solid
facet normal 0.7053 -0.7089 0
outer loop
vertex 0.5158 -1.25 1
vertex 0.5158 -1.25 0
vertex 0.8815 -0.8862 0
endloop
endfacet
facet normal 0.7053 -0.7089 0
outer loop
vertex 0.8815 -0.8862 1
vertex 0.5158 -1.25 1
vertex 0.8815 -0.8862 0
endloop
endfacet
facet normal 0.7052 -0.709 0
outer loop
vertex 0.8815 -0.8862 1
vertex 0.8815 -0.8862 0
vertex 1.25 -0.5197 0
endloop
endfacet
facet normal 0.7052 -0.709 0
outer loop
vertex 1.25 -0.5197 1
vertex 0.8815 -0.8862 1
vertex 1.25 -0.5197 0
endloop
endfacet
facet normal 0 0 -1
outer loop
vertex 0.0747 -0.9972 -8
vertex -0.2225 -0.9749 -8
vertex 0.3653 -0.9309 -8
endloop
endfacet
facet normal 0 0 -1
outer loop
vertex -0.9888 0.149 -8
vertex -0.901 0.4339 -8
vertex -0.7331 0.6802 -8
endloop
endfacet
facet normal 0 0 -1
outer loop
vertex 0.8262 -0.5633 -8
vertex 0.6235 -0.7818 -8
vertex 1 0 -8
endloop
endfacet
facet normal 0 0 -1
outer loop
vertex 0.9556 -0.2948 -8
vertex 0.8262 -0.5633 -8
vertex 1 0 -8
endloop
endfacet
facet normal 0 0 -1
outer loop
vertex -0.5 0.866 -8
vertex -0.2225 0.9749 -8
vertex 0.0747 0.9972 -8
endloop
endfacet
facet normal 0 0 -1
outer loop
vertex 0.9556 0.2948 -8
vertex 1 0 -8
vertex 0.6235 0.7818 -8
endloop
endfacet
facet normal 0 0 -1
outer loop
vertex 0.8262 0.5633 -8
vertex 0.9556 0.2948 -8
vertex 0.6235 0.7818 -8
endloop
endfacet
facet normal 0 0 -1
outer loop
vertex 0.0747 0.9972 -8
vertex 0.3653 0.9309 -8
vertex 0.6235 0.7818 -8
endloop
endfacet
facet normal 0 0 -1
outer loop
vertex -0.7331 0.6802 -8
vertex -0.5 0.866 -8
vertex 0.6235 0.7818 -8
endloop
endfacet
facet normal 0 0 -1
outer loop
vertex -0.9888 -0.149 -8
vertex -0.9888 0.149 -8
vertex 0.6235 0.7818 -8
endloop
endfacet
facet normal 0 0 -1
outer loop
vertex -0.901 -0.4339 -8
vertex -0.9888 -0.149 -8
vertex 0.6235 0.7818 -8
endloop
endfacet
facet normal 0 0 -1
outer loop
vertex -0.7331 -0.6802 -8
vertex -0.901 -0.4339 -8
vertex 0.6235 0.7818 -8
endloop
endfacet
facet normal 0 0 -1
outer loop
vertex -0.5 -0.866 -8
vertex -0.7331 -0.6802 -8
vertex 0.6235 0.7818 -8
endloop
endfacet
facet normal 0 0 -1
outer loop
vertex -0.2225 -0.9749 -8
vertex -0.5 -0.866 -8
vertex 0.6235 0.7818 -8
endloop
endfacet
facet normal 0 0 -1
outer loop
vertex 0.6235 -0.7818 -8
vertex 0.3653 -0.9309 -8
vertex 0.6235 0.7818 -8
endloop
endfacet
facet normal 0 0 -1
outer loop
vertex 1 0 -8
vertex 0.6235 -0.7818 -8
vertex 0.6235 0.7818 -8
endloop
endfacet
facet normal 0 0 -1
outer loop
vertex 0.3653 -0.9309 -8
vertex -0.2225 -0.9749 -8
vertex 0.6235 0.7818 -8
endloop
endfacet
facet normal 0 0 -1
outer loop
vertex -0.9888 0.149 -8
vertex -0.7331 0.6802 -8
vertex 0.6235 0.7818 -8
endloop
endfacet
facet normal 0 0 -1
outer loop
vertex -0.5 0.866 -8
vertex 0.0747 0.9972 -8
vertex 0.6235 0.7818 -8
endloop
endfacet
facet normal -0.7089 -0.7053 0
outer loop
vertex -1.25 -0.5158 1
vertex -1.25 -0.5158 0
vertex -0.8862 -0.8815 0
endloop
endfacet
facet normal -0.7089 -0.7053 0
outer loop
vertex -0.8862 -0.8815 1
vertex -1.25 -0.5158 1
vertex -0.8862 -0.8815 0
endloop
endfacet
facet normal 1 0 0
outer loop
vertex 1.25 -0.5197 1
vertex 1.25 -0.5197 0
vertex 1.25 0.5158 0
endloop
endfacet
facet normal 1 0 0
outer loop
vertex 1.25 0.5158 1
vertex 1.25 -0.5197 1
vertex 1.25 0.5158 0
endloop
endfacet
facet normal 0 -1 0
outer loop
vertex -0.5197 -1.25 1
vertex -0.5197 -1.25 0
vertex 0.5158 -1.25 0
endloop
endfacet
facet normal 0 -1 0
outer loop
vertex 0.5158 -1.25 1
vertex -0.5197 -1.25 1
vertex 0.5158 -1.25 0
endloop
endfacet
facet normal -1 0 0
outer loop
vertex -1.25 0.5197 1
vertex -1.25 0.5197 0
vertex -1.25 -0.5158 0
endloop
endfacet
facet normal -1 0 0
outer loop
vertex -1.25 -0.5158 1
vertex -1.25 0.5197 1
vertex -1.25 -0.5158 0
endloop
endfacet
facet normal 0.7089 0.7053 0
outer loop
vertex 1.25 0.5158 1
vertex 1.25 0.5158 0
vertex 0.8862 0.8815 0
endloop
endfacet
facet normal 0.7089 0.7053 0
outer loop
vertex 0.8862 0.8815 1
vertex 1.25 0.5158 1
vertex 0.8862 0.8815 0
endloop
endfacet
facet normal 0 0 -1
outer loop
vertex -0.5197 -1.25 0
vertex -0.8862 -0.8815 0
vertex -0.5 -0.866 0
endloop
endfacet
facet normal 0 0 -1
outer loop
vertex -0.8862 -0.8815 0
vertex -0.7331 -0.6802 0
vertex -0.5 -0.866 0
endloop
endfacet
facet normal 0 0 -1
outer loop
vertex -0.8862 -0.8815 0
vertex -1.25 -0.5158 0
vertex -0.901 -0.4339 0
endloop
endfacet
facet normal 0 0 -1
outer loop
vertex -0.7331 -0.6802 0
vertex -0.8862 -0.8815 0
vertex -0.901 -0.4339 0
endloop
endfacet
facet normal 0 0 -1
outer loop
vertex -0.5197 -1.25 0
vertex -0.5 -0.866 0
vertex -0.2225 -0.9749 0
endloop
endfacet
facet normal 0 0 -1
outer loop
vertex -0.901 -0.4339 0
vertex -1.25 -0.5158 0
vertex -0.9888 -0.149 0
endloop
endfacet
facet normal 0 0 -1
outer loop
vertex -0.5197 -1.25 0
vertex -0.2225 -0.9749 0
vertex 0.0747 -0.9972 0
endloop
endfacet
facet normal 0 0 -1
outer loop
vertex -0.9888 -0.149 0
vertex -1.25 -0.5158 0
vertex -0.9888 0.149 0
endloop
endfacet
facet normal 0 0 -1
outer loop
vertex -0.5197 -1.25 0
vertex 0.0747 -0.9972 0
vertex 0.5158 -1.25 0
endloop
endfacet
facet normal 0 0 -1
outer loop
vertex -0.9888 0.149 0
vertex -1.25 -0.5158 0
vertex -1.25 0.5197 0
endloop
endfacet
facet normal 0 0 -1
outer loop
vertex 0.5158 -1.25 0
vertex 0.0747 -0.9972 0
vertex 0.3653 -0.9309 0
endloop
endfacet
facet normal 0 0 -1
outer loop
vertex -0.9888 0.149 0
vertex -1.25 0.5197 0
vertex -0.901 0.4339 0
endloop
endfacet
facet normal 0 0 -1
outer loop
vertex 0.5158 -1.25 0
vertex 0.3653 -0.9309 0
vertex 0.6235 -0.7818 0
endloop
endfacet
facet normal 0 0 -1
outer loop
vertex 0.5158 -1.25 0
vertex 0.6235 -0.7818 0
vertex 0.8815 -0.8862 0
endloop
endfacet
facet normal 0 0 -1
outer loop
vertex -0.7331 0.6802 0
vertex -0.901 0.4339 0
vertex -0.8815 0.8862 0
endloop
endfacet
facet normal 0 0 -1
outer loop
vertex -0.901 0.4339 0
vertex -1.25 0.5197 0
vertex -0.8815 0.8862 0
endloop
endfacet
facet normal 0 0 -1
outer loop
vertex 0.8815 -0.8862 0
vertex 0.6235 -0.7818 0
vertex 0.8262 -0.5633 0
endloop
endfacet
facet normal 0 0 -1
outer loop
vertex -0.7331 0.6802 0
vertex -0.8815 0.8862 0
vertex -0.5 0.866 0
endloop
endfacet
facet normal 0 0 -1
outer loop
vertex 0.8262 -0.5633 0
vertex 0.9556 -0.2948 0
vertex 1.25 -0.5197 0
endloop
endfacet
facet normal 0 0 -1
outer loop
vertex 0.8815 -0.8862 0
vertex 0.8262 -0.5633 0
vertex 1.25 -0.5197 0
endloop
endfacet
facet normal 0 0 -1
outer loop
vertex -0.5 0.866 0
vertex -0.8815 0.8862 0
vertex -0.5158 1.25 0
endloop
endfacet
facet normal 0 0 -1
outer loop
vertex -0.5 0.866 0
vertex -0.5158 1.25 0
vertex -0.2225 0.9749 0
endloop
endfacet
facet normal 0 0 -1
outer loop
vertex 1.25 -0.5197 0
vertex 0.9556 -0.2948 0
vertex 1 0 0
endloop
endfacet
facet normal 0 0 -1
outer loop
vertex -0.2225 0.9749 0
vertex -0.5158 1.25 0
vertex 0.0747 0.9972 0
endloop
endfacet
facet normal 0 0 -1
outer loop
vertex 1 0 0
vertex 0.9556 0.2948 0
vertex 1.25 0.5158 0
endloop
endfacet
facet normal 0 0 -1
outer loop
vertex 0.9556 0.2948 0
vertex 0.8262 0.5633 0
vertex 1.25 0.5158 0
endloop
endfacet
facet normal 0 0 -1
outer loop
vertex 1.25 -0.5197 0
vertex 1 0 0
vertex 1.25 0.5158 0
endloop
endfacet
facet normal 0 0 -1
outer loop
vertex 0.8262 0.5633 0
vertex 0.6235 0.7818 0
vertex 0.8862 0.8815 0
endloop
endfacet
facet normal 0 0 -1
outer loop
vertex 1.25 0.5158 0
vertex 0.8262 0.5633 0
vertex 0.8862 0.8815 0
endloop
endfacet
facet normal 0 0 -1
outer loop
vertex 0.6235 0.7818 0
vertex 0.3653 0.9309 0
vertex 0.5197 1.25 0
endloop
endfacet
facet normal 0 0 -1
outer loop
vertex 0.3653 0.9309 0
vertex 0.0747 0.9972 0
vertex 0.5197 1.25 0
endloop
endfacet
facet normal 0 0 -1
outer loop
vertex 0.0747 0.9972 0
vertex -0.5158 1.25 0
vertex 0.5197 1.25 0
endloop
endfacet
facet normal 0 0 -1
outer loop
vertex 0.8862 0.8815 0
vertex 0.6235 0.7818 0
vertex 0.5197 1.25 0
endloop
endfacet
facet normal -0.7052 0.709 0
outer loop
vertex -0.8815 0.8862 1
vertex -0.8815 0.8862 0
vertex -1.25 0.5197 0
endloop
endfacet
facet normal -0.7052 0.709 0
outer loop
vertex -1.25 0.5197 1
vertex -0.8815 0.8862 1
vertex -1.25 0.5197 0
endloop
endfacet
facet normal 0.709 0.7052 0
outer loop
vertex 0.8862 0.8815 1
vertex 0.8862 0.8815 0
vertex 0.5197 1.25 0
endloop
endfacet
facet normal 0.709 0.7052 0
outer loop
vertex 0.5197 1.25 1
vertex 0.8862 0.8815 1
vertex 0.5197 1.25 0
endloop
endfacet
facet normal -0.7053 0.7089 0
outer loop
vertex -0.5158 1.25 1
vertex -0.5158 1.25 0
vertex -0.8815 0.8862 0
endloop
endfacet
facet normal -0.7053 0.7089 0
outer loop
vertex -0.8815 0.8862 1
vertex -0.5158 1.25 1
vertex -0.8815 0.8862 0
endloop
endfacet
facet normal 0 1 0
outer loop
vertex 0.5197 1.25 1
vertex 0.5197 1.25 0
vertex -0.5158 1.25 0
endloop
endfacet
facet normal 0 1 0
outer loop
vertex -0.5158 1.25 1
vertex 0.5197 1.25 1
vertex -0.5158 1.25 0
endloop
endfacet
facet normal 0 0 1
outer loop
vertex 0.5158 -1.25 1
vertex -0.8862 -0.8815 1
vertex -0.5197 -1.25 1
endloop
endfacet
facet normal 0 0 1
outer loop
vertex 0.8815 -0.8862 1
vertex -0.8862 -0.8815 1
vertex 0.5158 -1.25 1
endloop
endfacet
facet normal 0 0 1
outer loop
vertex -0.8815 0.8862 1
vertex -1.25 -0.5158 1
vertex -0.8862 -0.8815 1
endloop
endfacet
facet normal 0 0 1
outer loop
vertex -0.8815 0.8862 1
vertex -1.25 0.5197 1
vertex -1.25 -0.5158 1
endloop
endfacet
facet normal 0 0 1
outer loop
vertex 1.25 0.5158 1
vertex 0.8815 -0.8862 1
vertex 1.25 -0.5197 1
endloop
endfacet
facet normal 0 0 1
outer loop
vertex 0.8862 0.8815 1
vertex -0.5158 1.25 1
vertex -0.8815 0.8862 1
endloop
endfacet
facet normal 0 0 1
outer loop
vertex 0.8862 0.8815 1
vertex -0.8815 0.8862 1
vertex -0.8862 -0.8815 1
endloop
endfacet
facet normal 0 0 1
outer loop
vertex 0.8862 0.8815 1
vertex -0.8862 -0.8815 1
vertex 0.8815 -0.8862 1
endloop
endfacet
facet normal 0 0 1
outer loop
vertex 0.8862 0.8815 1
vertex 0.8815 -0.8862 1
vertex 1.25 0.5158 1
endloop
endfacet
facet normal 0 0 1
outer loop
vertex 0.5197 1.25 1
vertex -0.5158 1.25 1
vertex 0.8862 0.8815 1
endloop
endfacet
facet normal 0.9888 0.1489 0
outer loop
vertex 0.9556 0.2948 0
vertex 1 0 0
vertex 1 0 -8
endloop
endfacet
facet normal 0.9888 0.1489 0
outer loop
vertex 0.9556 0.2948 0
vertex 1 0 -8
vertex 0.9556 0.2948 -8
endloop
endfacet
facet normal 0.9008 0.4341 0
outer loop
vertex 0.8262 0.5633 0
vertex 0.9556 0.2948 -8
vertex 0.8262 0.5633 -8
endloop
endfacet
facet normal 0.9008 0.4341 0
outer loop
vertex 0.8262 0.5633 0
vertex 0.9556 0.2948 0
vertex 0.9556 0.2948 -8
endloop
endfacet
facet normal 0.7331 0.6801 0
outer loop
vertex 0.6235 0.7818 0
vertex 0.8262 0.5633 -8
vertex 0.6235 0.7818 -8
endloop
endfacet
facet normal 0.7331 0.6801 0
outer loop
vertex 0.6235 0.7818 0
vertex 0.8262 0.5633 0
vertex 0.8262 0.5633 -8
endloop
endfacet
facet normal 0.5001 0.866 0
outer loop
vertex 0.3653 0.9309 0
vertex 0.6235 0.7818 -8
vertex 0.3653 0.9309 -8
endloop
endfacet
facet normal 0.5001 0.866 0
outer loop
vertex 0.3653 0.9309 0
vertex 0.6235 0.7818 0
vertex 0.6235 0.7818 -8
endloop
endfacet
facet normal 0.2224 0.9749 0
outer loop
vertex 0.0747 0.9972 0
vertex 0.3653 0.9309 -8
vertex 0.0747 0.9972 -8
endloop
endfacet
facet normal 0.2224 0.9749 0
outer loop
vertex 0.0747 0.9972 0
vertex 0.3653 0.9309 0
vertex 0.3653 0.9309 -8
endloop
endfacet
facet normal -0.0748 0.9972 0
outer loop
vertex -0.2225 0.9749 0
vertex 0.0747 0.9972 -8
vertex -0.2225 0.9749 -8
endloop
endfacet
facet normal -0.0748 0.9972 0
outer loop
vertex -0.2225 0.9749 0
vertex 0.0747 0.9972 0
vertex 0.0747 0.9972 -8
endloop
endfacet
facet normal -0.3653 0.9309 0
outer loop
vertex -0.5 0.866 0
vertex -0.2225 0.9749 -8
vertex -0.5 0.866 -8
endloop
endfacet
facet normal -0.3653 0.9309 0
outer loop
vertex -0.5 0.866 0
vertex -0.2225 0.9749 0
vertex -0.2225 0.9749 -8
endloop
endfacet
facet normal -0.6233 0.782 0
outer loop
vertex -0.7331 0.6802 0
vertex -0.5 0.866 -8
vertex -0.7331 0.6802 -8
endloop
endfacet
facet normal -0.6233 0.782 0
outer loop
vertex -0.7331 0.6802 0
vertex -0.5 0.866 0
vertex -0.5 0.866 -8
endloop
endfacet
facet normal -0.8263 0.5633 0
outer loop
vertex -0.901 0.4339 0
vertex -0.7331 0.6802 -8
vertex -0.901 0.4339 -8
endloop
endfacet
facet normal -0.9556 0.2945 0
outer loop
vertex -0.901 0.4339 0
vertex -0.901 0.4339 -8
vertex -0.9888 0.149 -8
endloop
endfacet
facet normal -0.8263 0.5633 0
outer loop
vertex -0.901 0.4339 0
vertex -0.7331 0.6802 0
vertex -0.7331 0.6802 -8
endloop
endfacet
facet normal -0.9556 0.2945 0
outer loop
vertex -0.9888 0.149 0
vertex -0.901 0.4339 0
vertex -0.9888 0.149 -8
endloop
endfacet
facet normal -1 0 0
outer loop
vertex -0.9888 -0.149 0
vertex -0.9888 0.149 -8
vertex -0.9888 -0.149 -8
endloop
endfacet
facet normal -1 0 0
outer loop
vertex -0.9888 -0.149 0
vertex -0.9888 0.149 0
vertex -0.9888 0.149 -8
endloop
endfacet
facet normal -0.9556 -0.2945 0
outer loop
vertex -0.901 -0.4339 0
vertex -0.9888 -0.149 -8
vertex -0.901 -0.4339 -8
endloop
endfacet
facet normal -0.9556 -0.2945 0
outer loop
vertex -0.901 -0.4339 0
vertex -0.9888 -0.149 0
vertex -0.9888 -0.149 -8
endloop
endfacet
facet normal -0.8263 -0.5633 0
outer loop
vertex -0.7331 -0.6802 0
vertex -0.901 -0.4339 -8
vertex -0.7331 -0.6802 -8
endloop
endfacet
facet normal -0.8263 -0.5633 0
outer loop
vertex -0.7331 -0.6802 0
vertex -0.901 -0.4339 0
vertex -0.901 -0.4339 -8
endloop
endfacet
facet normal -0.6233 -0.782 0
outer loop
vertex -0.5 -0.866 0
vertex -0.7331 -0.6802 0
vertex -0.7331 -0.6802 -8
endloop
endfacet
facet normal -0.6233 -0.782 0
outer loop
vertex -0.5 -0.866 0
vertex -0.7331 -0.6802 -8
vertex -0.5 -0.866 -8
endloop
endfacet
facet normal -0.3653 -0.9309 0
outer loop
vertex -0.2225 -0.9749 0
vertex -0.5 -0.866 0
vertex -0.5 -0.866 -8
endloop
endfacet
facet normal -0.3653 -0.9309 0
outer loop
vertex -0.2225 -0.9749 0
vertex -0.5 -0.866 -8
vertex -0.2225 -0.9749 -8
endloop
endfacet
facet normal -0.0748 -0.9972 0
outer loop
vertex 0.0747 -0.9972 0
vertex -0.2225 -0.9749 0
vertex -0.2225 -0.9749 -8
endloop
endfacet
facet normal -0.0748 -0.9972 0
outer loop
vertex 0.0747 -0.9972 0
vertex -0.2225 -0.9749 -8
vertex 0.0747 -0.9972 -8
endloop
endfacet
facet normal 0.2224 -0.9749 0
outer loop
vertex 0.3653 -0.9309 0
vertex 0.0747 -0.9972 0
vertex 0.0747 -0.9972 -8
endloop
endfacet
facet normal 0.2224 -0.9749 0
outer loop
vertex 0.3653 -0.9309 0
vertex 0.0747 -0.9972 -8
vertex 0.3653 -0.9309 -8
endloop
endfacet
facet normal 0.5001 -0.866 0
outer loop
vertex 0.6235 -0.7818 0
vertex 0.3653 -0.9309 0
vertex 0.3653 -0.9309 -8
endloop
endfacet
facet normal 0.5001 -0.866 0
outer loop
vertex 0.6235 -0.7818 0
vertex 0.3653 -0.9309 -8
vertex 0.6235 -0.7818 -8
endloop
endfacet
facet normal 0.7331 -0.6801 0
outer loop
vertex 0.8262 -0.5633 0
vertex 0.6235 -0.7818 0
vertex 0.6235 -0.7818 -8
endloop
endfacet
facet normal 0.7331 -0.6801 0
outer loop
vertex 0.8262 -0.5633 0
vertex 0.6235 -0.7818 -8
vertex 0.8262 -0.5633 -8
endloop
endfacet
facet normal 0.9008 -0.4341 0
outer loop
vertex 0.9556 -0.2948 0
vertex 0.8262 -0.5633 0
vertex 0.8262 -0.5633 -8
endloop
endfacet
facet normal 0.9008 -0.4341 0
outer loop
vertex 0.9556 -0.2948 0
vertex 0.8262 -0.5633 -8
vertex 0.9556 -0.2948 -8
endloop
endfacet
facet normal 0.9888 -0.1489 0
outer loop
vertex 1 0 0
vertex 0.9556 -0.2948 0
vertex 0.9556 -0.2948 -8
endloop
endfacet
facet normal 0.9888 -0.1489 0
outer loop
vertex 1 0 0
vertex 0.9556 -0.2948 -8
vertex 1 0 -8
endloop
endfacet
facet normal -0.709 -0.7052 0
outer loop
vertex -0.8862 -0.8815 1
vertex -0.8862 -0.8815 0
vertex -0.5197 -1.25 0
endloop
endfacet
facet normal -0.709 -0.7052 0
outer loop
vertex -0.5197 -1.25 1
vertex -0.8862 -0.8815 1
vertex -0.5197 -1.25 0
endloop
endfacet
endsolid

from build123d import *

# Parameters (mm, degrees)
F1_DEPTH = 1
F2_R     = 1
F3_DEPTH = 9


with BuildPart() as f1:
    # F0 (on Top) → F1 (new body)
    with BuildSketch(Plane.XY):
        Polygon((-0.881542, 0.886219), (0, 0), (0, 1.25), (-0.515831, 1.25), align=None)
        Polygon((0.881542, -0.886219), (0, 0), (0, -1.25), (0.515831, -1.25), align=None)
        Polygon((0.886219, 0.881542), (0, 0), (1.25, 0), (1.25, 0.515831), align=None)
        Polygon((-0.886219, -0.881542), (0, 0), (-1.25, 0), (-1.25, -0.515831), align=None)
        Polygon((0, 1.25), (0, 0), (0.886219, 0.881542), (0.519705, 1.25), align=None)
        Polygon((0, -1.25), (0, 0), (-0.886219, -0.881542), (-0.519705, -1.25), align=None)
        Polygon((1.25, 0), (0, 0), (0.881542, -0.886219), (1.25, -0.519705), align=None)
        Polygon((-1.25, 0), (0, 0), (-0.881542, 0.886219), (-1.25, 0.519705), align=None)
    extrude(amount=F1_DEPTH)

    # F2 (on face) → F3 (join)
    with BuildSketch(Plane.XY.offset(1)):
        Circle(F2_R)
    extrude(amount=-F3_DEPTH)


solid = f1.part
